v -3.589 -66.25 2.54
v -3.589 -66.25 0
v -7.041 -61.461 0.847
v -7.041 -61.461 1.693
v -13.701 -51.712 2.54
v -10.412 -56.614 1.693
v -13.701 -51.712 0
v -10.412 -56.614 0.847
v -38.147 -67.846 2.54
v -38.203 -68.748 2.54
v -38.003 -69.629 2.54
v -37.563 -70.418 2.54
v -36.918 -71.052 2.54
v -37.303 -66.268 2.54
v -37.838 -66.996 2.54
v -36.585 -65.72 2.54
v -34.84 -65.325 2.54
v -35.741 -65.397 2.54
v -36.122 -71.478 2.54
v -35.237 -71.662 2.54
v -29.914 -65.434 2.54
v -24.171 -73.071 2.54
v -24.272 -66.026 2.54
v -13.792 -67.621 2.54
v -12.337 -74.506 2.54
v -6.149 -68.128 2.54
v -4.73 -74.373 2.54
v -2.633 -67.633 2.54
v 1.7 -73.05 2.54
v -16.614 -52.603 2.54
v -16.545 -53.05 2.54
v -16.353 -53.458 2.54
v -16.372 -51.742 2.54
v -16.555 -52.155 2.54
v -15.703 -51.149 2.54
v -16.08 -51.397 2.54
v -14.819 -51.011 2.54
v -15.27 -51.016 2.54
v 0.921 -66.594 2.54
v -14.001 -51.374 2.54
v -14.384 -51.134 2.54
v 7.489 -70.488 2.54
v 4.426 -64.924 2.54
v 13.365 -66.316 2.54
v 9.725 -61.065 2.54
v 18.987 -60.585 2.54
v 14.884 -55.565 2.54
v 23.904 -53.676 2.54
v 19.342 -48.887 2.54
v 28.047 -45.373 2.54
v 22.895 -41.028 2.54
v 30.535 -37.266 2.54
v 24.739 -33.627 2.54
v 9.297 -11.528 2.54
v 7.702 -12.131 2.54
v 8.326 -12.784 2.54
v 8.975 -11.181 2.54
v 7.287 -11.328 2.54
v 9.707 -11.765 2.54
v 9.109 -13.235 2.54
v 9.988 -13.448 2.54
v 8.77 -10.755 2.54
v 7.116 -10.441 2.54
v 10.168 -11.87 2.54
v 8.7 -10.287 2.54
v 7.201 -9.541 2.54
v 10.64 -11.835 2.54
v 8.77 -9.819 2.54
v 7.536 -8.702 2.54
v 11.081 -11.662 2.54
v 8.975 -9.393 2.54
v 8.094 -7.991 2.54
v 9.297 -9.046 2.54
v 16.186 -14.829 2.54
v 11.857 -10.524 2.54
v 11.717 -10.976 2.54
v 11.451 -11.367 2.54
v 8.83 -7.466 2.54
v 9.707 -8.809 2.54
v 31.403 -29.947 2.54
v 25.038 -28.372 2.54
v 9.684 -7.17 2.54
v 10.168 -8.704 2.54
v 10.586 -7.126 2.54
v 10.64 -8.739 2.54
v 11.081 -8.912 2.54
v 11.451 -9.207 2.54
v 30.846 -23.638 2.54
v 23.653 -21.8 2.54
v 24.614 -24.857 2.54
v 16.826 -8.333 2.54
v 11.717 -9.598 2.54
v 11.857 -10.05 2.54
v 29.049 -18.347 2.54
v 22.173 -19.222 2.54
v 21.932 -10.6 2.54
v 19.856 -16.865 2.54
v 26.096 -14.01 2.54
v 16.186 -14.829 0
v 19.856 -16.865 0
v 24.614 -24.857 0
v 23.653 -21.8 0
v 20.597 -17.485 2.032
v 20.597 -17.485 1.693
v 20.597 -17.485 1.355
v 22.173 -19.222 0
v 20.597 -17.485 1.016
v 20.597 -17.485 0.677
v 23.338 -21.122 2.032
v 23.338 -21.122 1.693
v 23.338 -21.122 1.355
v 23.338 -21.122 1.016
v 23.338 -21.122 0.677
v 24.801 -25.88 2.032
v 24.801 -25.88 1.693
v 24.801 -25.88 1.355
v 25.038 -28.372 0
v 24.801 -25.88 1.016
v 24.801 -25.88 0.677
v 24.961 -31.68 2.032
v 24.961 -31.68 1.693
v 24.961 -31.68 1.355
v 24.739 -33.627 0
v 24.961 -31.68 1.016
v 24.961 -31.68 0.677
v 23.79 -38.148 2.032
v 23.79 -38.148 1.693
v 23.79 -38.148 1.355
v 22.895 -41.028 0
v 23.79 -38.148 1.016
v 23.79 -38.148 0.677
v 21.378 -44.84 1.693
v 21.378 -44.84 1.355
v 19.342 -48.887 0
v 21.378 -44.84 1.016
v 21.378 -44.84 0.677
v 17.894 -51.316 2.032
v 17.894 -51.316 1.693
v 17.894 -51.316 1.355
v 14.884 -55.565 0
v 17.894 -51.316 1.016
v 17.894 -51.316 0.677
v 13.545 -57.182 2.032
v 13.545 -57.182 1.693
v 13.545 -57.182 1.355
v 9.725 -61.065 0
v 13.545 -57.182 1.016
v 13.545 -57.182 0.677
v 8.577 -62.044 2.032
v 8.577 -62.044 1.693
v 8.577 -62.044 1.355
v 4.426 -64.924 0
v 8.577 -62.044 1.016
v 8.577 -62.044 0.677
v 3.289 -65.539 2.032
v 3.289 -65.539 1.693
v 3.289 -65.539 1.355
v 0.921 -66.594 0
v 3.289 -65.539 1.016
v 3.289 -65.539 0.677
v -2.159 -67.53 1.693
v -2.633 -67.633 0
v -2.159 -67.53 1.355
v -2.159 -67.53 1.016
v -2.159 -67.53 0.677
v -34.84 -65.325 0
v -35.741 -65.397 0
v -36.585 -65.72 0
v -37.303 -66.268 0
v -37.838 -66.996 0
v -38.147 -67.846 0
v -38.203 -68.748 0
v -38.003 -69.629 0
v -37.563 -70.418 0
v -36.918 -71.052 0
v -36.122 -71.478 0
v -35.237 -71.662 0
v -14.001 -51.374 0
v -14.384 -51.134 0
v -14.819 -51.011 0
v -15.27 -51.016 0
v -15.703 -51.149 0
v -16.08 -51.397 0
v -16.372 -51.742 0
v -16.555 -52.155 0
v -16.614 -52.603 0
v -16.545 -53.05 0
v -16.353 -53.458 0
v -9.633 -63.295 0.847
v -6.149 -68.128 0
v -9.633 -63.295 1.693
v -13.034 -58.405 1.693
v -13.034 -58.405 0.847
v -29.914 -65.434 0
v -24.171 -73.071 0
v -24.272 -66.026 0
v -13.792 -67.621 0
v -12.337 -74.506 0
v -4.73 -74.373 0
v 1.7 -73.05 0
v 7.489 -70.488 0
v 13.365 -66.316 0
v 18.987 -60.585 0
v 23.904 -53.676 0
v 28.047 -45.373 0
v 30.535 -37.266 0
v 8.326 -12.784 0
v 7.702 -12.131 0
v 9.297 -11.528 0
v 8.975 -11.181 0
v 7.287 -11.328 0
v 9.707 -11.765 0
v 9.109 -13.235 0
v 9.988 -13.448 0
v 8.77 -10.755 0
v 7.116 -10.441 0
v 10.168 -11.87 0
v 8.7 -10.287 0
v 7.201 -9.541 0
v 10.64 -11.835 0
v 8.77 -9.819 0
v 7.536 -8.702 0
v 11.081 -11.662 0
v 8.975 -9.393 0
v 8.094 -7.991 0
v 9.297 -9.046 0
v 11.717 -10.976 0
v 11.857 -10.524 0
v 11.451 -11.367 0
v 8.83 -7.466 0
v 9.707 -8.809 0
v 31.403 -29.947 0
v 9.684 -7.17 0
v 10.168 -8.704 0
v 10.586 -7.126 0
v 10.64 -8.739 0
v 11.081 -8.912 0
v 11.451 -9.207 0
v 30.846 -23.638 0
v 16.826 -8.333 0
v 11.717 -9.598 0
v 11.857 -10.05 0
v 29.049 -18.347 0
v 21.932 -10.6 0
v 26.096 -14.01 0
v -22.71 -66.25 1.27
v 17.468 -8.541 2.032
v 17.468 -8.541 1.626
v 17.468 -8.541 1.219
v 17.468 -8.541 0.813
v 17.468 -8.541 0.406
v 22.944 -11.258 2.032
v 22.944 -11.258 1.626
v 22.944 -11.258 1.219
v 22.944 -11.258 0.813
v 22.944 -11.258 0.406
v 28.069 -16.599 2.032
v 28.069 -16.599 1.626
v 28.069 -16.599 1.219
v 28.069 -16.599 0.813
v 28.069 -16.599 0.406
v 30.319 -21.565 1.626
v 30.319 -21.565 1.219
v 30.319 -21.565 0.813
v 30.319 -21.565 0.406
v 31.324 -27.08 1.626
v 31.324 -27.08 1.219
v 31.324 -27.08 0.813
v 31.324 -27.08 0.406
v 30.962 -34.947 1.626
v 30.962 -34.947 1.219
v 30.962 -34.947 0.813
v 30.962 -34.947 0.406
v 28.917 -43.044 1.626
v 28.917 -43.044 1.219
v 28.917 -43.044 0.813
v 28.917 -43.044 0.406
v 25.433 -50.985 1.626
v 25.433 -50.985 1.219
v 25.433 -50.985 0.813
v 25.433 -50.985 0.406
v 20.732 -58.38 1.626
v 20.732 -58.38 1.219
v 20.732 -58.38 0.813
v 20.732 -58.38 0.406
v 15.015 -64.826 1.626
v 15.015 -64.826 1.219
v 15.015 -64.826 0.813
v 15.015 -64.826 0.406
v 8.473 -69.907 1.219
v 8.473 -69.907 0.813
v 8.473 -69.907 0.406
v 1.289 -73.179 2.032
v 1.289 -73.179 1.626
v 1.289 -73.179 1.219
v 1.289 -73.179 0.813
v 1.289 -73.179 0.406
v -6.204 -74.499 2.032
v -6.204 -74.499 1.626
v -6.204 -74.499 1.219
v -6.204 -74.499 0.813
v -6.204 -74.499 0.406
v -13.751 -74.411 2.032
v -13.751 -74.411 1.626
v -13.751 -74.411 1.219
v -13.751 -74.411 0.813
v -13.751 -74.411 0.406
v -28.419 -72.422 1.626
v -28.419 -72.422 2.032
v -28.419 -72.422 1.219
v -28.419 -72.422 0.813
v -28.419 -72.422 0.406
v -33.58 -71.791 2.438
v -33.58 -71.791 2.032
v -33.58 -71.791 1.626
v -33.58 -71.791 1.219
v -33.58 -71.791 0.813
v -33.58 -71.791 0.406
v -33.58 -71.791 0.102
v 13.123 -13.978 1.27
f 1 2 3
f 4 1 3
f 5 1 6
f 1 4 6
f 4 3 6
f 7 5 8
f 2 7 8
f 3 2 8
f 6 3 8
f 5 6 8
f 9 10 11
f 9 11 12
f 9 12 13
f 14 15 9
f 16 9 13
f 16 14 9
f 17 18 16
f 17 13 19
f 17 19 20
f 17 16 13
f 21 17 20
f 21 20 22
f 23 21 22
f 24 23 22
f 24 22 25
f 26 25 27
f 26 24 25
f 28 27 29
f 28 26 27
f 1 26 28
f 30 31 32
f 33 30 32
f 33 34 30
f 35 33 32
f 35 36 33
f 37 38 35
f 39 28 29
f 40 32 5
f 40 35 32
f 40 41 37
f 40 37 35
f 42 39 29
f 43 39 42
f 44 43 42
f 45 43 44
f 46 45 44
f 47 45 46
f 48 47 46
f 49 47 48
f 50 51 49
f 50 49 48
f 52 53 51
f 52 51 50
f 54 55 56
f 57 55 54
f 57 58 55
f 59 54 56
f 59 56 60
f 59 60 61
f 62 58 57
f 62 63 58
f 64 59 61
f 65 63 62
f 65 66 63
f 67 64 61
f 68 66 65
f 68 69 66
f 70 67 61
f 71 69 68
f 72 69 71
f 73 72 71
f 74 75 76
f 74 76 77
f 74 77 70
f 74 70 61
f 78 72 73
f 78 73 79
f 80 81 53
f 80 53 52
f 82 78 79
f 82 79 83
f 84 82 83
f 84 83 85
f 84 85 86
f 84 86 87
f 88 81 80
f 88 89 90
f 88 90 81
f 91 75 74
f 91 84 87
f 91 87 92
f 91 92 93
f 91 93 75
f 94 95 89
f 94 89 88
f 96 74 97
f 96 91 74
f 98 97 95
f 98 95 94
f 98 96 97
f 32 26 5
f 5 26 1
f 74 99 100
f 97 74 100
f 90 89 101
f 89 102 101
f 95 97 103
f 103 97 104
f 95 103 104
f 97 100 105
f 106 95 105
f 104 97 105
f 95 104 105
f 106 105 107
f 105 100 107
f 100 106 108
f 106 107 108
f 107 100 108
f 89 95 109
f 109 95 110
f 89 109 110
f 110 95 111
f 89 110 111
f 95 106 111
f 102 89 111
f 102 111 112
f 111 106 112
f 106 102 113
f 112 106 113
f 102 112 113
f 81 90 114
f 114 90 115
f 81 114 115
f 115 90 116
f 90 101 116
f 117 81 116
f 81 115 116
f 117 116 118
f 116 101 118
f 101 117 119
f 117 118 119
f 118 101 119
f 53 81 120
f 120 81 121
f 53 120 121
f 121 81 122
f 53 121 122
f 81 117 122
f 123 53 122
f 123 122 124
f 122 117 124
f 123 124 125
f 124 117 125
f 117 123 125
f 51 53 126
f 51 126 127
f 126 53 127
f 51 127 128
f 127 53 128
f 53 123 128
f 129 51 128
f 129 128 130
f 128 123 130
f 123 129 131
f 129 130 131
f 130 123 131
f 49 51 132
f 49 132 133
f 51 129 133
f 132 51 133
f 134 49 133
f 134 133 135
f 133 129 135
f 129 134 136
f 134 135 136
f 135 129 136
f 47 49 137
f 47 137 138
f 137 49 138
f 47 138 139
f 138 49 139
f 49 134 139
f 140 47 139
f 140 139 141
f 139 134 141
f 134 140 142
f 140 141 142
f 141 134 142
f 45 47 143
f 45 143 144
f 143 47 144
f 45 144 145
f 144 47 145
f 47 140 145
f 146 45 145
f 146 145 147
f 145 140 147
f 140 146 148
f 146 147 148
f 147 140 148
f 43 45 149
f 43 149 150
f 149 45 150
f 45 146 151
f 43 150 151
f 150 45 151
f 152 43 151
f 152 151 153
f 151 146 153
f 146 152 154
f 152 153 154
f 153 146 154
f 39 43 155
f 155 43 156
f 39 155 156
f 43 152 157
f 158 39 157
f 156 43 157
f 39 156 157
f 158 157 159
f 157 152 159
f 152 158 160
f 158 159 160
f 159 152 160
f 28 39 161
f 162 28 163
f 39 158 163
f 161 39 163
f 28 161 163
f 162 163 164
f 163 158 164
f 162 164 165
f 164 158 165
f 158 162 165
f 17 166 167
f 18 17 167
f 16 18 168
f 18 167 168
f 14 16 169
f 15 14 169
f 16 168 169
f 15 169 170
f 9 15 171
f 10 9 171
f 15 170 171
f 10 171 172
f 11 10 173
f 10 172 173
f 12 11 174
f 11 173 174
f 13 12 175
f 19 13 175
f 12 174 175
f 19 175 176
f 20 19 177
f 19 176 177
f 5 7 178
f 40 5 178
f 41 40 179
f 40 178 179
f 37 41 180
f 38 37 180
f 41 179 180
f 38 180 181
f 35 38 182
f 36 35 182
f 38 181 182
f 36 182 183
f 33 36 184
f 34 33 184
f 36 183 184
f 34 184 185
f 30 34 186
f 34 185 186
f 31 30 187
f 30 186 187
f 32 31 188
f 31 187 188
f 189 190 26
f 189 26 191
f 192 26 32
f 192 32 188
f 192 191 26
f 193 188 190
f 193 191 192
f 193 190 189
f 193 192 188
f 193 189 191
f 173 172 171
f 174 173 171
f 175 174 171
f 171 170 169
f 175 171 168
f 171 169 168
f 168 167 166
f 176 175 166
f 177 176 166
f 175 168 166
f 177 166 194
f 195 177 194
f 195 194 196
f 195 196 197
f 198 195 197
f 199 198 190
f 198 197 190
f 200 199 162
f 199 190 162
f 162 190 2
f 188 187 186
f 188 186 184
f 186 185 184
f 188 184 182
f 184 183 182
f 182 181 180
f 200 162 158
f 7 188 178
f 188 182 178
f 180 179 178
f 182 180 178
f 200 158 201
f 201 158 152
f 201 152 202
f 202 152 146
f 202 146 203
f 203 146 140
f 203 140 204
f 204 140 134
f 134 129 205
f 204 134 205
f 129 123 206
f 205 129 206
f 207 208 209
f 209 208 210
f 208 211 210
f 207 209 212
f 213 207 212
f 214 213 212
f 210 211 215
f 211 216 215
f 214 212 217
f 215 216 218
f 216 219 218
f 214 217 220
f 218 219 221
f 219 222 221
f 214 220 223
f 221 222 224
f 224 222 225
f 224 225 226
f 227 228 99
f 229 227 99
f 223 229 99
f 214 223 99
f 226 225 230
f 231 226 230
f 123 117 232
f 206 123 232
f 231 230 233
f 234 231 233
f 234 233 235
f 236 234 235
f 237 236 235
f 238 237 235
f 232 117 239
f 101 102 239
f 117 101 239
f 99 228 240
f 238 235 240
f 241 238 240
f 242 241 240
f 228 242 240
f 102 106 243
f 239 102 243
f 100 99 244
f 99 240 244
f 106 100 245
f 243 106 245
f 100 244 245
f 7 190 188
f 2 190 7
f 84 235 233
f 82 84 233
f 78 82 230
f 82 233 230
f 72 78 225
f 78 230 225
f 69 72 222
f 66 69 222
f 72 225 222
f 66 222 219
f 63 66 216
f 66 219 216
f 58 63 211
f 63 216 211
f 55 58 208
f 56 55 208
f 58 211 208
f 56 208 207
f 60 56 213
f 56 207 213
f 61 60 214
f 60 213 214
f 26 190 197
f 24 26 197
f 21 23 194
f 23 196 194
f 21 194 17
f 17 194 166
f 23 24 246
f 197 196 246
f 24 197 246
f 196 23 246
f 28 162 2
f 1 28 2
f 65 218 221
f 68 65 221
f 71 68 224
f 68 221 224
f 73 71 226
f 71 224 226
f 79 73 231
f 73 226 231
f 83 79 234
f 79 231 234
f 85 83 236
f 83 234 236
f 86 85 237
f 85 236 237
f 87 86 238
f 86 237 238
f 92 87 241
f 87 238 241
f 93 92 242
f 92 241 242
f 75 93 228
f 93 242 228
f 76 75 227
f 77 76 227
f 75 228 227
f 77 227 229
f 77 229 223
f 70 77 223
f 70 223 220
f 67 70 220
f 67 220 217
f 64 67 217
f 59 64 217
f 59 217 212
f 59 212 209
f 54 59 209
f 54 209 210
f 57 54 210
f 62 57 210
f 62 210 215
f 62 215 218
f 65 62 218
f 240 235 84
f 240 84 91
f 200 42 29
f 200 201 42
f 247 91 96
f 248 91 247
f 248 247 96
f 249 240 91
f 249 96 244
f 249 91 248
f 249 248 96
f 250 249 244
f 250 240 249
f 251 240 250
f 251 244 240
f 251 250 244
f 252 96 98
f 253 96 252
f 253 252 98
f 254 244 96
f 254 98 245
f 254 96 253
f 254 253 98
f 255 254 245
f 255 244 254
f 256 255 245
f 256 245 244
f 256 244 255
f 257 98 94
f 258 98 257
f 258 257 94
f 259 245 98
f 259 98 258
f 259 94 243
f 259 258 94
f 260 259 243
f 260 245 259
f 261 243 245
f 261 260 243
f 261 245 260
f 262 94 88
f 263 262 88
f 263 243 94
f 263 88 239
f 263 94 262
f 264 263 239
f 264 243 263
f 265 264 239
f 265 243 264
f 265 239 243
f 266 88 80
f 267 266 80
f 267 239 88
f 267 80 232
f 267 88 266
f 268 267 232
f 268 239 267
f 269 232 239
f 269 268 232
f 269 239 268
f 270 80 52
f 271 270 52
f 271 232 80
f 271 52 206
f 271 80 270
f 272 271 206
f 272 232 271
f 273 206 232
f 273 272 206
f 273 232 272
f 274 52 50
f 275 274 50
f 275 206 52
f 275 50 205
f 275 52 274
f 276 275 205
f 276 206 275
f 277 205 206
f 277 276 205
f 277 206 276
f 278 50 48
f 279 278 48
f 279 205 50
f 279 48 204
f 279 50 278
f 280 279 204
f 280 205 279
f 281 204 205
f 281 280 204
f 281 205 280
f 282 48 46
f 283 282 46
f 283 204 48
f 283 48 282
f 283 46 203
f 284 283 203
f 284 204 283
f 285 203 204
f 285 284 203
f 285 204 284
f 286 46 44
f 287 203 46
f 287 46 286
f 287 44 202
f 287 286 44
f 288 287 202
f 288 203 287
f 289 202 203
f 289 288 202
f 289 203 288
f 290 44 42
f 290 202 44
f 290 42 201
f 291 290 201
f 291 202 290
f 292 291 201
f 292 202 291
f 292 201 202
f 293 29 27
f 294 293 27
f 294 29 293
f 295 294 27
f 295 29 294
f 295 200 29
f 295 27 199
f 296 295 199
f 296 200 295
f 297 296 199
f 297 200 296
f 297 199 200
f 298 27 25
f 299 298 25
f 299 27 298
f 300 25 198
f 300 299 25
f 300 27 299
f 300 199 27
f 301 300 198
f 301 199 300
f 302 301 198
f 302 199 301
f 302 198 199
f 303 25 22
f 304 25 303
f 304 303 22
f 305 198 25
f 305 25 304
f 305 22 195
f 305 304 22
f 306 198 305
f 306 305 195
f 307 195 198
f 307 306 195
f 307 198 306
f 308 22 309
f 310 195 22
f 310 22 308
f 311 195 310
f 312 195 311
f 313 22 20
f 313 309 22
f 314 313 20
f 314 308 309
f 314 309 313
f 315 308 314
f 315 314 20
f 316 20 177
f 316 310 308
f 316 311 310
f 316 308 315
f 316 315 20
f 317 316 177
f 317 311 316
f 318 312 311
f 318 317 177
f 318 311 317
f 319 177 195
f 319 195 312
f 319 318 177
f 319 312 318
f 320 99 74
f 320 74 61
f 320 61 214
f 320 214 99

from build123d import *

# Parameters (mm, degrees)
BOSS_EXTRUDE1_DEPTH = 2.54
CUT_EXTRUDE1_REACH  = 85.854
SKETCH3_R           = 1.5875


with BuildPart() as part:
    # Sketch1 → Boss-Extrude1 (new body)
    with BuildSketch(Plane.XY):
        with BuildLine():
            ThreePointArc((-34.83986326, -65.324552852), (-38.2071347, -68.294861429), (-35.236826123, -71.66213287))
            add(Edge.make_bspline(
                [(10.586372466, -7.126145507), (11.002525682, -7.165560423), (11.842009581, -7.259594031), (13.445793666, -7.497821941), (15.358508428, -7.892790201), (17.493715434, -8.516327348), (20.134435017, -9.541319585), (23.047894952, -11.172937086), (25.921475474, -13.638972903), (28.170317734, -16.539917581), (30.356639499, -20.877284542), (31.65118113, -26.978157887), (31.240937045, -34.908794595), (29.156003941, -43.069094129), (25.635995414, -51.07625165), (20.90067039, -58.538840574), (15.150976409, -65.0507057), (8.587997117, -70.214219903), (1.335167823, -73.532497291), (-6.197343227, -74.730184138), (-13.766967954, -74.543564506), (-19.99707814, -73.723544541), (-24.863533758, -72.962255978), (-28.436362961, -72.408085673), (-31.328557034, -72.018315593), (-33.588022169, -71.782799811), (-34.683820018, -71.696771152), (-35.236826123, -71.66213287)],
                knots=[0, 0, 0, 0, 0.0078125, 0.015625, 0.03125, 0.046875, 0.0625, 0.09375, 0.125, 0.15625, 0.1875, 0.25, 0.3125, 0.375, 0.4375, 0.5, 0.5625, 0.625, 0.6875, 0.75, 0.8125, 0.875, 0.90625, 0.9375, 0.96875, 0.984375, 1, 1, 1, 1], degree=3))
            ThreePointArc((10.586372466, -7.126145507), (7.126145507, -9.987627534), (9.987627534, -13.447854493))
            add(Edge.make_bspline(
                [(16.185687447, -14.828634458), (13.159279331, -13.818364694), (9.987627534, -13.447854493)],
                knots=[0, 0, 0, 1, 1, 1], degree=2))
            add(Edge.make_bspline(
                [(16.185687447, -14.828634458), (16.626552591, -14.999751236), (17.516256805, -15.389362386), (19.048590925, -16.233671216), (20.665851366, -17.447101789), (22.192245289, -19.130255303), (23.78737336, -21.720766981), (25.019404327, -25.697186568), (25.187096787, -31.56718704), (23.997883937, -38.111286688), (20.745345962, -47.132853017), (15.329747873, -55.703582215), (8.621815884, -62.281522038), (4.20572917, -65.207038027), (0.573138185, -66.788444018), (-1.381931567, -67.361931374), (-2.474374912, -67.600151096), (-2.633155696, -67.633149977)],
                knots=[0.054733487, 0.054733487, 0.054733487, 0.054733487, 0.069503276, 0.084273066, 0.113812644, 0.143352223, 0.172891801, 0.231970958, 0.291050115, 0.350129272, 0.409208429, 0.527366744, 0.586445901, 0.645525058, 0.675064636, 0.704604215, 0.709598679, 0.709598679, 0.709598679, 0.709598679], degree=3))
            Line((-2.633155696, -67.633149977), (-3.589318796, -66.250016051))
            add(Edge.make_bspline(
                [(-3.589318796, -66.250016051), (-7.081368607, -61.490752258), (-10.454154618, -56.641640427), (-13.701165647, -51.711942352)],
                knots=[0, 0, 0, 0, 1, 1, 1, 1], degree=3))
            ThreePointArc((-13.701165647, -51.711942352), (-15.900149416, -51.259412923), (-16.352678845, -53.458396692))
            add(Edge.make_bspline(
                [(-6.149161319, -68.128268232), (-9.674217346, -63.32402075), (-13.075389854, -58.43406357), (-16.352678845, -53.458396692)],
                knots=[0, 0, 0, 0, 1, 1, 1, 1], degree=3))
            add(Edge.make_bspline(
                [(-6.149161319, -68.128268232), (-11.754405025, -68.216156013), (-21.178886313, -66.241491877), (-30.778963239, -65.215205279), (-34.83986326, -65.324552852)],
                knots=[0, 0, 0, 0, 0.578093232, 1, 1, 1, 1], degree=3))
        make_face()
    extrude(amount=BOSS_EXTRUDE1_DEPTH)

    # Sketch3 → Cut-Extrude1 (cut, up to next)
    with BuildSketch(Plane(origin=(0, 0, 0), x_dir=(-1, 0, 0), z_dir=(0, 0, -1)), mode=Mode.PRIVATE) as cut_extrude1_sk1:
        with Locations((-10.287, -10.287)):
            Circle(SKETCH3_R)
    cut_extrude1_tool1 = extrude(cut_extrude1_sk1.sketch, amount=-CUT_EXTRUDE1_REACH, mode=Mode.PRIVATE) & part.part
    add(cut_extrude1_tool1.solids().sort_by_distance((10.287, -10.287, 0))[0], mode=Mode.SUBTRACT)


solid = part.part
